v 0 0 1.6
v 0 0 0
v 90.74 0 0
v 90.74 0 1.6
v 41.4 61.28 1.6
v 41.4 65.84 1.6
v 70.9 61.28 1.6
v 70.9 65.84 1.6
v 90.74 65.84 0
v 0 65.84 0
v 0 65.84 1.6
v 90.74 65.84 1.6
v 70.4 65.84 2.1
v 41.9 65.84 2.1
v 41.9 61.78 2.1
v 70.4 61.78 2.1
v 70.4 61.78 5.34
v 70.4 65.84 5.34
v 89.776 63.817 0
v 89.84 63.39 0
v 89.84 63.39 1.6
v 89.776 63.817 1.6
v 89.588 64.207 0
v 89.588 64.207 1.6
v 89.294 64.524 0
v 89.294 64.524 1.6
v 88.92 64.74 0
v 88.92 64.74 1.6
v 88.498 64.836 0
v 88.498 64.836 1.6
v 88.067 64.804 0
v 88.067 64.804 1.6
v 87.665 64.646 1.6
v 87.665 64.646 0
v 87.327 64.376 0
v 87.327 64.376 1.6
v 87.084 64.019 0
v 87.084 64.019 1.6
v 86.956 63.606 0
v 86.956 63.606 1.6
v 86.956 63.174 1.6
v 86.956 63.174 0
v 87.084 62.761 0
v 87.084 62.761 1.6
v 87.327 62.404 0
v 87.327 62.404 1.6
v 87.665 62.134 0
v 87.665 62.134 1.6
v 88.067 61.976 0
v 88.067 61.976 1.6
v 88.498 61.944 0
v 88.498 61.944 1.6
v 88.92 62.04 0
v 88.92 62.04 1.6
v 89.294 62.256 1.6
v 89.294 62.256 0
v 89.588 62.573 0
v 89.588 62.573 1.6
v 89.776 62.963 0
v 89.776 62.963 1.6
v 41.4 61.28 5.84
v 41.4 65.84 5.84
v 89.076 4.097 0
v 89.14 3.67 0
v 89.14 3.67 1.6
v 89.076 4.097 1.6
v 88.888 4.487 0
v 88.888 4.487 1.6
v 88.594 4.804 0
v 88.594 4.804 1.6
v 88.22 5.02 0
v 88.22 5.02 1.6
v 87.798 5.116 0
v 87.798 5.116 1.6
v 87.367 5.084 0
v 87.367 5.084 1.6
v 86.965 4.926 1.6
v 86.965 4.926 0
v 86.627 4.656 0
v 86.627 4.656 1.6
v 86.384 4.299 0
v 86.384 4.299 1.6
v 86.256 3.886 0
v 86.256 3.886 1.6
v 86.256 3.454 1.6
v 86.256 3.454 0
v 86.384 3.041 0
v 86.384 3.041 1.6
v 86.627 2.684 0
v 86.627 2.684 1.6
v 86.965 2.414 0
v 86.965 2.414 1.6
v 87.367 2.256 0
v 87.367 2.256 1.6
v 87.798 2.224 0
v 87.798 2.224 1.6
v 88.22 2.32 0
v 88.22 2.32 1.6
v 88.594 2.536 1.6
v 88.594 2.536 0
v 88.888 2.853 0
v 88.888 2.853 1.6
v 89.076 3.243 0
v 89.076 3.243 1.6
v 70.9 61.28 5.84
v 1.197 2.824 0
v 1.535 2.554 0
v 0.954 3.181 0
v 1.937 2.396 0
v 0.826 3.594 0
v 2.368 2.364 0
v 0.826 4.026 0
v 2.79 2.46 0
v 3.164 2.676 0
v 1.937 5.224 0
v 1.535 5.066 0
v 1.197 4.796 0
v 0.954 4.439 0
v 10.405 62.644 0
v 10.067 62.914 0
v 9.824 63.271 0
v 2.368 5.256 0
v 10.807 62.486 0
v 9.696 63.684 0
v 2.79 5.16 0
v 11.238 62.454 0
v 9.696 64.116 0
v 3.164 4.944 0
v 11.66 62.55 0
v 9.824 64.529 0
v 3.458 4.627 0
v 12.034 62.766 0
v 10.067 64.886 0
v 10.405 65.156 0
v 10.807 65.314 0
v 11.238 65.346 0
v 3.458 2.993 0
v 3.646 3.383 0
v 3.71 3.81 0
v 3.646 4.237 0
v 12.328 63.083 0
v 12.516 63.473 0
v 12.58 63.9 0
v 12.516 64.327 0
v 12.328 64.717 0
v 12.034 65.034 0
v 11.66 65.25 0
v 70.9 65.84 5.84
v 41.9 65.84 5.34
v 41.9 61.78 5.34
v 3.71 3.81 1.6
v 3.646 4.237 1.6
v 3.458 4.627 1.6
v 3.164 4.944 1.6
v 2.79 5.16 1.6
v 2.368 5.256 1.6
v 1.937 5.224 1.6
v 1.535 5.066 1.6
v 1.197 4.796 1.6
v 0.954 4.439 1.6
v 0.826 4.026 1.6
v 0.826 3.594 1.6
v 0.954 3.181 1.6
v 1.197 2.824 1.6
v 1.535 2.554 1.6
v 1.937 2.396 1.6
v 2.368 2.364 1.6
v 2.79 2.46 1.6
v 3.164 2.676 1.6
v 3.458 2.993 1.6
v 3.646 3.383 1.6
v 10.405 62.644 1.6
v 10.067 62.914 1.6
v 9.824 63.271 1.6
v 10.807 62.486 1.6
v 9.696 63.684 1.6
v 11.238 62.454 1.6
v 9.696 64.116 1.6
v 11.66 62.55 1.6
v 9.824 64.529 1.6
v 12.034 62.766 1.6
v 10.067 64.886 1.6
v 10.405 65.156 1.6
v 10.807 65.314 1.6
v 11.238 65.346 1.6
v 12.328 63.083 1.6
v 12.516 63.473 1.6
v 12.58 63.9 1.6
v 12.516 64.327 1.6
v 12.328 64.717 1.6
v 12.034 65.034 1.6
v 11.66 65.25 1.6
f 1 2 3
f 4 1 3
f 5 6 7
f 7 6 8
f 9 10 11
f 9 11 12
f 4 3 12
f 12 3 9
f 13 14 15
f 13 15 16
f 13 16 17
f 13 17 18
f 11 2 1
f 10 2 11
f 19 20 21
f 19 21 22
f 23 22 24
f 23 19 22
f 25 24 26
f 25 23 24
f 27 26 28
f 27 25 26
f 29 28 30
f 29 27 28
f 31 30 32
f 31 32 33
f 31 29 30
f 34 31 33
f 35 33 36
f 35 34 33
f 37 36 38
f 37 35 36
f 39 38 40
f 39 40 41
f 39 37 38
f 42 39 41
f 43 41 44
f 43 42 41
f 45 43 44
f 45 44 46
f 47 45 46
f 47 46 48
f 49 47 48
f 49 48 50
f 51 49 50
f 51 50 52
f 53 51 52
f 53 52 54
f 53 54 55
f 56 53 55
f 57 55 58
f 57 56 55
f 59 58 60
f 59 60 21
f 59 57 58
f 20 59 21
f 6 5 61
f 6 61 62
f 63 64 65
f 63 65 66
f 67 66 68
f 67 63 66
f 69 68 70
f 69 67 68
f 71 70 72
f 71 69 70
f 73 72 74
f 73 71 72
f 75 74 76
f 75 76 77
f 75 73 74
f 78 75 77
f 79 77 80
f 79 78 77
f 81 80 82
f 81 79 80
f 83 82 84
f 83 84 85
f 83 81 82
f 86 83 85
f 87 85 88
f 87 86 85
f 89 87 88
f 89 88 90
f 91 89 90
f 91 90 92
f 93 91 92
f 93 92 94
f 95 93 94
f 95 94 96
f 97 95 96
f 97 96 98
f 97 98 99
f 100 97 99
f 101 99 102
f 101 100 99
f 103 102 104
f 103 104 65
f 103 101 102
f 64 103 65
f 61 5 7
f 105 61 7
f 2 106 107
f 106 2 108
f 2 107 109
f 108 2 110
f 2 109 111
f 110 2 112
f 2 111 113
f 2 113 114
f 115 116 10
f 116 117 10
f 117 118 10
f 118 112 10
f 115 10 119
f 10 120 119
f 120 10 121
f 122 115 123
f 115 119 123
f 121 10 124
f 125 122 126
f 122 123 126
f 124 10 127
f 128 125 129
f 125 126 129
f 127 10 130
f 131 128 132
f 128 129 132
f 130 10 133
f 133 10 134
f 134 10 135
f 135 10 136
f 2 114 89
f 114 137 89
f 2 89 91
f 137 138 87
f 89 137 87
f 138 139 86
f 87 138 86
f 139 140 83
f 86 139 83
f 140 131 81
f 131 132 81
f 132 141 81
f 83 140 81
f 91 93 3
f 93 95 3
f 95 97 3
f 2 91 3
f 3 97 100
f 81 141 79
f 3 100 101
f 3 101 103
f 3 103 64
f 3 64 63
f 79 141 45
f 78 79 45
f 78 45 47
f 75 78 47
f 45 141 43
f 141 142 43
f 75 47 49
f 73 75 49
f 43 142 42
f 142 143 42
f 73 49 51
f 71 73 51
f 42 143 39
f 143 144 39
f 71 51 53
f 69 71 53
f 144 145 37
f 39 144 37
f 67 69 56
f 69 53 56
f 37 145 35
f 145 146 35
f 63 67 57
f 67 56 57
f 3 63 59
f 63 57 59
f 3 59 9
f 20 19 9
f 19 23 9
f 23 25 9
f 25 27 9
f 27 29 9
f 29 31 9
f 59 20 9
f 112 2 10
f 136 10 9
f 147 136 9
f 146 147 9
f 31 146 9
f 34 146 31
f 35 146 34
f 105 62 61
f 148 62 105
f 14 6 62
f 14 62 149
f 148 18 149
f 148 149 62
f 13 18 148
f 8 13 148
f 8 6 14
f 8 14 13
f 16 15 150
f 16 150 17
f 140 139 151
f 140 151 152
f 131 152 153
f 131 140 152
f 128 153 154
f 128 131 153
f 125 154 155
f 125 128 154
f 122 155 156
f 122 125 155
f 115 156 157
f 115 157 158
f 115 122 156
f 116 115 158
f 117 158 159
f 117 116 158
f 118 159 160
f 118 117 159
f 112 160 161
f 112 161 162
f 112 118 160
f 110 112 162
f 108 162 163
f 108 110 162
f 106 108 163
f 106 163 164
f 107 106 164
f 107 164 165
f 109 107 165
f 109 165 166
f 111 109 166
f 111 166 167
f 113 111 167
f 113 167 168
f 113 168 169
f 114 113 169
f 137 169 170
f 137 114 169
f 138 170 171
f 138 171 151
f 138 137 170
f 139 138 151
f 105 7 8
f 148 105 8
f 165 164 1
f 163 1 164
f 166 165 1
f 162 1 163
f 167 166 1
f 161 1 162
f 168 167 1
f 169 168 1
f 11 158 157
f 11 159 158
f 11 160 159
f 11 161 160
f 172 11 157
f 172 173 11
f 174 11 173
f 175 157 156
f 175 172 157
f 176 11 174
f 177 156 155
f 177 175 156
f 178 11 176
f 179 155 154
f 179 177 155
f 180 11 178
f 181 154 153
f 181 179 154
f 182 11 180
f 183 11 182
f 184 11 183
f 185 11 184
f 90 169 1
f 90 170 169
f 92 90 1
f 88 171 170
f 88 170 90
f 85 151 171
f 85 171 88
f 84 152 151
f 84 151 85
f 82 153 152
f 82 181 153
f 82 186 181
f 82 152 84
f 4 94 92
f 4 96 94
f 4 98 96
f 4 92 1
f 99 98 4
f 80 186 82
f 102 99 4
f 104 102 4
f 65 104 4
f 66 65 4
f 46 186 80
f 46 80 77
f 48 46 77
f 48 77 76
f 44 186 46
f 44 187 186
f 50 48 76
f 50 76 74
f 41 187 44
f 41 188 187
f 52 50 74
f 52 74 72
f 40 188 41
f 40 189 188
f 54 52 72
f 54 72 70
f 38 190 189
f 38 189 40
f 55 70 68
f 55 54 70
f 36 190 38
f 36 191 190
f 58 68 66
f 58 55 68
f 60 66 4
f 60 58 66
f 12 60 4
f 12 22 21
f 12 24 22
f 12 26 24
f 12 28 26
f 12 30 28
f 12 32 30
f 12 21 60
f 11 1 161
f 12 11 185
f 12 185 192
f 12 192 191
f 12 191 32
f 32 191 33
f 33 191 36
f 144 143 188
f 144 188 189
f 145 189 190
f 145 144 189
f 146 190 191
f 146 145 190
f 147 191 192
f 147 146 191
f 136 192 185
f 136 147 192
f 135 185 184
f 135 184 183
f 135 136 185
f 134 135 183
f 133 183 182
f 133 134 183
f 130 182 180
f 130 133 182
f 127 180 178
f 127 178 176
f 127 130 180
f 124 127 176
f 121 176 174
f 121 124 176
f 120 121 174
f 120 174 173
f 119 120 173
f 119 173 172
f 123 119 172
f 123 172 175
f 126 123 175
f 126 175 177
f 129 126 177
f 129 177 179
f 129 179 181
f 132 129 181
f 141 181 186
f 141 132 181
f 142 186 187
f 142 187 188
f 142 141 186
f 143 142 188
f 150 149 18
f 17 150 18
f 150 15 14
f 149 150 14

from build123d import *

# Parameters (mm, degrees)
F0_W     = 90.74
F0_H     = 65.84
F0_R     = 1.45
F1_DEPTH = 1.6
F2_W     = 29.5
F2_H     = 4.56
F3_DEPTH = 4.24
F4_T     = -0.5


with BuildPart() as f1:
    # F0 (on Top) → F1 (new body)
    with BuildSketch(Plane.XY):
        with Locations((45.37, 32.92)):
            Rectangle(F0_W, F0_H)
        with Locations((2.26, 3.81)):
            Circle(F0_R, mode=Mode.SUBTRACT)
        with Locations((87.69, 3.67)):
            Circle(F0_R, mode=Mode.SUBTRACT)
        with Locations((11.13, 63.9)):
            Circle(F0_R, mode=Mode.SUBTRACT)
        with Locations((88.39, 63.39)):
            Circle(F0_R, mode=Mode.SUBTRACT)
    extrude(amount=F1_DEPTH)


with BuildPart() as f3:
    # F2 (on face) → F3 (new body)
    with BuildSketch(Plane.XY.offset(1.6)):
        with Locations((56.15, 63.56)):
            Rectangle(F2_W, F2_H)
    extrude(amount=F3_DEPTH)

    # F4
    f4_openings = [f3.faces().sort_by_distance(p)[0] for p in [
        (56.15, 65.84, 3.72),
    ]]
    offset(amount=F4_T, openings=f4_openings)


solid = Compound([f1.part, f3.part])
